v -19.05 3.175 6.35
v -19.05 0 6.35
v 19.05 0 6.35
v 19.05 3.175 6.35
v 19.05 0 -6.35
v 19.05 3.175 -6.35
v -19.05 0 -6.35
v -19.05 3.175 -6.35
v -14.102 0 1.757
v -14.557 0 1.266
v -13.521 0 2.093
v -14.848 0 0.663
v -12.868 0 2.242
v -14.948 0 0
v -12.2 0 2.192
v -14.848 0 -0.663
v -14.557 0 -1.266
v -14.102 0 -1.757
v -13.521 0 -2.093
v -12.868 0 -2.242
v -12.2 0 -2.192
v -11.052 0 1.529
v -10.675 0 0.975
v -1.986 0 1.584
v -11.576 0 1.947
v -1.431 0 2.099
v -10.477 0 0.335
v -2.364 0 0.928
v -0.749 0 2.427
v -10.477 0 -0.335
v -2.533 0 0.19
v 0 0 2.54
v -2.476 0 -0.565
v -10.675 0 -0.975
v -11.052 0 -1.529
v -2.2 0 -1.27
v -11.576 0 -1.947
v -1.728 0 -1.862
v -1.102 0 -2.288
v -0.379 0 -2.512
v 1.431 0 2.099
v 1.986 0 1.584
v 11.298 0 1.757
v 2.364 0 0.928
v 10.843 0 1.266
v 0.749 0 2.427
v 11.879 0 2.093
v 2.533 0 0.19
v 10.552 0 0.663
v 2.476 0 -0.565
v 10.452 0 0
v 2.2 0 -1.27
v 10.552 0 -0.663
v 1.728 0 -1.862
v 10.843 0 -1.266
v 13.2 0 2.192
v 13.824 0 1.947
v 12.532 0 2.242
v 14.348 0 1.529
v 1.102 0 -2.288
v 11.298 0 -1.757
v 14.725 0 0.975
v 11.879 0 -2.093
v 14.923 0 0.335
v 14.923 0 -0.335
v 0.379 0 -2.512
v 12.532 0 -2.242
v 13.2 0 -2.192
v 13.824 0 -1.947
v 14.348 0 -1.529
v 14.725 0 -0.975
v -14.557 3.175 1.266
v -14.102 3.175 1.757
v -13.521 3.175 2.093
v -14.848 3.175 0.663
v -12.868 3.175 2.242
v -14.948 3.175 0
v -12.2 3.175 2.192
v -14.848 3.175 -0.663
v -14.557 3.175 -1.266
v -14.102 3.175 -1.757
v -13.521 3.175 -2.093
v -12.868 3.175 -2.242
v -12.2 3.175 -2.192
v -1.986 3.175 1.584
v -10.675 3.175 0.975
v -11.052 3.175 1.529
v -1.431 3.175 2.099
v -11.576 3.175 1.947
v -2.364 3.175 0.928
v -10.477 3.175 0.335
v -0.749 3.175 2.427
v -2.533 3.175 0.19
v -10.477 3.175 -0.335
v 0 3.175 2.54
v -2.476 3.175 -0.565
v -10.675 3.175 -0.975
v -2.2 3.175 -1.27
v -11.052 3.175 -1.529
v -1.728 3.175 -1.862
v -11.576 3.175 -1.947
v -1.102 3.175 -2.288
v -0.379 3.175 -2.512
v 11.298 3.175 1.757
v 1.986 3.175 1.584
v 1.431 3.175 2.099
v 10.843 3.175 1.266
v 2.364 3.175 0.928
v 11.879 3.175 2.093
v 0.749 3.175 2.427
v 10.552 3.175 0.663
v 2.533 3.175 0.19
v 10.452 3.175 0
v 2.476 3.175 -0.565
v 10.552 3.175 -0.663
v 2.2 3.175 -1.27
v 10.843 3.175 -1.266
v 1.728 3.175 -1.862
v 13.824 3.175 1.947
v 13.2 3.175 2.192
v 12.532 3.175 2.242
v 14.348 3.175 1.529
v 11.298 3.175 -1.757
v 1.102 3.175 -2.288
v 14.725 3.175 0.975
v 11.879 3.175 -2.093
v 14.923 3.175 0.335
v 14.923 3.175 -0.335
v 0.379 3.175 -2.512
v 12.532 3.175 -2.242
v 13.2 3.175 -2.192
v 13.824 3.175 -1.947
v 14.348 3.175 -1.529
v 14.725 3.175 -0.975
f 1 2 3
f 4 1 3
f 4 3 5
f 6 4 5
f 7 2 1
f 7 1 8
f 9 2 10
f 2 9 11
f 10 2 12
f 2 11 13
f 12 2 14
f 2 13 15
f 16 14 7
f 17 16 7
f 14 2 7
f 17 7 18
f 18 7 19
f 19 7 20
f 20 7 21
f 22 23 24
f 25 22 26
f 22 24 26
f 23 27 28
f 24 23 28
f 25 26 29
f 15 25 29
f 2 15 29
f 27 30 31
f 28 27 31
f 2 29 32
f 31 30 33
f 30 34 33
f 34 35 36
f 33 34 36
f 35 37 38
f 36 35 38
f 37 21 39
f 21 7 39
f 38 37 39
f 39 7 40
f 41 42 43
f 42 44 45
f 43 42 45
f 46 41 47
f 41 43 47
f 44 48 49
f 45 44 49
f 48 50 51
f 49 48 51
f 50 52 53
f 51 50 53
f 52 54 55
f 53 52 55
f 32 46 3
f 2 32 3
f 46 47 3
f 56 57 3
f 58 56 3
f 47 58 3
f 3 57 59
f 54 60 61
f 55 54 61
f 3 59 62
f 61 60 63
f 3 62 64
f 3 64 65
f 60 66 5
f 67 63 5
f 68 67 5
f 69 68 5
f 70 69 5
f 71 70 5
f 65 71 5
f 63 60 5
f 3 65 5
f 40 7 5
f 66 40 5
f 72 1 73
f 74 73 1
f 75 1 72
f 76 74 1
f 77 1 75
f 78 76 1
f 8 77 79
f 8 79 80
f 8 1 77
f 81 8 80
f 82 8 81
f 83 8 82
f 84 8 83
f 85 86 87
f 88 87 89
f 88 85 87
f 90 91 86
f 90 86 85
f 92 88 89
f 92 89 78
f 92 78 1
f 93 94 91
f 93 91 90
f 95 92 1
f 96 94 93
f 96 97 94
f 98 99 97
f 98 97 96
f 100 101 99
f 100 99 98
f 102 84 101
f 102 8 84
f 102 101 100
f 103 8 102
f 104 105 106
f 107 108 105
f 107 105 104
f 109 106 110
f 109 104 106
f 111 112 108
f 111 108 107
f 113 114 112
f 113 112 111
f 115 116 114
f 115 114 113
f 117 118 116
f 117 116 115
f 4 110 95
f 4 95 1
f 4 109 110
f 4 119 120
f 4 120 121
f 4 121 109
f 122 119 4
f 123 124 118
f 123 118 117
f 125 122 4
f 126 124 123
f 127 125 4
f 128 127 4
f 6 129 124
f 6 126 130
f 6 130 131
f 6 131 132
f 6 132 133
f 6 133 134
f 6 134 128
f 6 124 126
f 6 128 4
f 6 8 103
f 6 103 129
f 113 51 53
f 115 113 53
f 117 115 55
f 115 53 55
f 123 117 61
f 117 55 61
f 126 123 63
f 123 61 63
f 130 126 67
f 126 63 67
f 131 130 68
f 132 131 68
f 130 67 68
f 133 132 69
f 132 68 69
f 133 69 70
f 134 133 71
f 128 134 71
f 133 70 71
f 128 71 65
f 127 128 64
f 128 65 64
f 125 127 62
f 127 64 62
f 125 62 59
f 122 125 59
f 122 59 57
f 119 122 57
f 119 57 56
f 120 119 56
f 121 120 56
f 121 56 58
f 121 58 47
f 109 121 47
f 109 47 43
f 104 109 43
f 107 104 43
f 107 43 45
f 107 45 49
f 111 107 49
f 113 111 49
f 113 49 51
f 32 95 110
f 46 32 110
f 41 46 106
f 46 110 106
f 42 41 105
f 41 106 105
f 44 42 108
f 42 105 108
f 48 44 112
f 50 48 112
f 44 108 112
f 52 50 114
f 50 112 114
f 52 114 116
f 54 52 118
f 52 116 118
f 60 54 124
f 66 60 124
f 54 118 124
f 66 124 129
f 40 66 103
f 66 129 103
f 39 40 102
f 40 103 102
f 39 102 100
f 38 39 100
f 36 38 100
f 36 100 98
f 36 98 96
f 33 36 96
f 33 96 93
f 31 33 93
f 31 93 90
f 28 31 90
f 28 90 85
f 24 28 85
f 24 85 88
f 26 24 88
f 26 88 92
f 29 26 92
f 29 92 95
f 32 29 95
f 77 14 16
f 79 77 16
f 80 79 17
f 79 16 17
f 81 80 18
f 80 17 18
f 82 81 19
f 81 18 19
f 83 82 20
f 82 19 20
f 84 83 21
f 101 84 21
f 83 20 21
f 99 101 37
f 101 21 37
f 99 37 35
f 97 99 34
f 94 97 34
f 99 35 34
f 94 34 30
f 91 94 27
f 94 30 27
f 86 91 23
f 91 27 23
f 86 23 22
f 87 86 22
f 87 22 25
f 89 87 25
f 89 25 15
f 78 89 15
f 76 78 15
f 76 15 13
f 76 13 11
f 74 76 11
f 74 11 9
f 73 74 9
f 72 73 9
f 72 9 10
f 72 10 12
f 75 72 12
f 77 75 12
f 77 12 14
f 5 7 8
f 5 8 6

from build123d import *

# Parameters (mm, degrees)
SKETCH1_W             = 38.1
SKETCH1_H             = 12.7
BOSS_EXTRUDE1_DEPTH   = 3.175
SKETCH2_R             = 2.54
CUT_EXTRUDE1_DEPTH    = 21.329919454
F_8_CLEARANCE_HOLE1_D = 4.4958


with BuildPart() as part:
    # Sketch1 → Boss-Extrude1 (new body)
    with BuildSketch(Plane(origin=(0, 0, 0), x_dir=(1, 0, 0), z_dir=(0, 1, 0))):
        Rectangle(SKETCH1_W, SKETCH1_H)
    extrude(amount=BOSS_EXTRUDE1_DEPTH)

    # Sketch2 → Cut-Extrude1 (cut, through all)
    with BuildSketch(Plane(origin=(0, 3.175, 0), x_dir=(1, 0, 0), z_dir=(0, 1, 0))):
        with Locations(Location((0, 0, 0), (0, 0, 270))):
            Circle(SKETCH2_R)
    extrude(amount=-CUT_EXTRUDE1_DEPTH, mode=Mode.SUBTRACT)

    # #8 Clearance Hole1 (through all)
    with Locations(Plane(origin=(0, 3.175, 0), x_dir=(1, 0, 0), z_dir=(0, 1, 0))):
        with Locations((-12.7, 0), (12.7, 0)):
            Hole(F_8_CLEARANCE_HOLE1_D / 2)


solid = part.part
